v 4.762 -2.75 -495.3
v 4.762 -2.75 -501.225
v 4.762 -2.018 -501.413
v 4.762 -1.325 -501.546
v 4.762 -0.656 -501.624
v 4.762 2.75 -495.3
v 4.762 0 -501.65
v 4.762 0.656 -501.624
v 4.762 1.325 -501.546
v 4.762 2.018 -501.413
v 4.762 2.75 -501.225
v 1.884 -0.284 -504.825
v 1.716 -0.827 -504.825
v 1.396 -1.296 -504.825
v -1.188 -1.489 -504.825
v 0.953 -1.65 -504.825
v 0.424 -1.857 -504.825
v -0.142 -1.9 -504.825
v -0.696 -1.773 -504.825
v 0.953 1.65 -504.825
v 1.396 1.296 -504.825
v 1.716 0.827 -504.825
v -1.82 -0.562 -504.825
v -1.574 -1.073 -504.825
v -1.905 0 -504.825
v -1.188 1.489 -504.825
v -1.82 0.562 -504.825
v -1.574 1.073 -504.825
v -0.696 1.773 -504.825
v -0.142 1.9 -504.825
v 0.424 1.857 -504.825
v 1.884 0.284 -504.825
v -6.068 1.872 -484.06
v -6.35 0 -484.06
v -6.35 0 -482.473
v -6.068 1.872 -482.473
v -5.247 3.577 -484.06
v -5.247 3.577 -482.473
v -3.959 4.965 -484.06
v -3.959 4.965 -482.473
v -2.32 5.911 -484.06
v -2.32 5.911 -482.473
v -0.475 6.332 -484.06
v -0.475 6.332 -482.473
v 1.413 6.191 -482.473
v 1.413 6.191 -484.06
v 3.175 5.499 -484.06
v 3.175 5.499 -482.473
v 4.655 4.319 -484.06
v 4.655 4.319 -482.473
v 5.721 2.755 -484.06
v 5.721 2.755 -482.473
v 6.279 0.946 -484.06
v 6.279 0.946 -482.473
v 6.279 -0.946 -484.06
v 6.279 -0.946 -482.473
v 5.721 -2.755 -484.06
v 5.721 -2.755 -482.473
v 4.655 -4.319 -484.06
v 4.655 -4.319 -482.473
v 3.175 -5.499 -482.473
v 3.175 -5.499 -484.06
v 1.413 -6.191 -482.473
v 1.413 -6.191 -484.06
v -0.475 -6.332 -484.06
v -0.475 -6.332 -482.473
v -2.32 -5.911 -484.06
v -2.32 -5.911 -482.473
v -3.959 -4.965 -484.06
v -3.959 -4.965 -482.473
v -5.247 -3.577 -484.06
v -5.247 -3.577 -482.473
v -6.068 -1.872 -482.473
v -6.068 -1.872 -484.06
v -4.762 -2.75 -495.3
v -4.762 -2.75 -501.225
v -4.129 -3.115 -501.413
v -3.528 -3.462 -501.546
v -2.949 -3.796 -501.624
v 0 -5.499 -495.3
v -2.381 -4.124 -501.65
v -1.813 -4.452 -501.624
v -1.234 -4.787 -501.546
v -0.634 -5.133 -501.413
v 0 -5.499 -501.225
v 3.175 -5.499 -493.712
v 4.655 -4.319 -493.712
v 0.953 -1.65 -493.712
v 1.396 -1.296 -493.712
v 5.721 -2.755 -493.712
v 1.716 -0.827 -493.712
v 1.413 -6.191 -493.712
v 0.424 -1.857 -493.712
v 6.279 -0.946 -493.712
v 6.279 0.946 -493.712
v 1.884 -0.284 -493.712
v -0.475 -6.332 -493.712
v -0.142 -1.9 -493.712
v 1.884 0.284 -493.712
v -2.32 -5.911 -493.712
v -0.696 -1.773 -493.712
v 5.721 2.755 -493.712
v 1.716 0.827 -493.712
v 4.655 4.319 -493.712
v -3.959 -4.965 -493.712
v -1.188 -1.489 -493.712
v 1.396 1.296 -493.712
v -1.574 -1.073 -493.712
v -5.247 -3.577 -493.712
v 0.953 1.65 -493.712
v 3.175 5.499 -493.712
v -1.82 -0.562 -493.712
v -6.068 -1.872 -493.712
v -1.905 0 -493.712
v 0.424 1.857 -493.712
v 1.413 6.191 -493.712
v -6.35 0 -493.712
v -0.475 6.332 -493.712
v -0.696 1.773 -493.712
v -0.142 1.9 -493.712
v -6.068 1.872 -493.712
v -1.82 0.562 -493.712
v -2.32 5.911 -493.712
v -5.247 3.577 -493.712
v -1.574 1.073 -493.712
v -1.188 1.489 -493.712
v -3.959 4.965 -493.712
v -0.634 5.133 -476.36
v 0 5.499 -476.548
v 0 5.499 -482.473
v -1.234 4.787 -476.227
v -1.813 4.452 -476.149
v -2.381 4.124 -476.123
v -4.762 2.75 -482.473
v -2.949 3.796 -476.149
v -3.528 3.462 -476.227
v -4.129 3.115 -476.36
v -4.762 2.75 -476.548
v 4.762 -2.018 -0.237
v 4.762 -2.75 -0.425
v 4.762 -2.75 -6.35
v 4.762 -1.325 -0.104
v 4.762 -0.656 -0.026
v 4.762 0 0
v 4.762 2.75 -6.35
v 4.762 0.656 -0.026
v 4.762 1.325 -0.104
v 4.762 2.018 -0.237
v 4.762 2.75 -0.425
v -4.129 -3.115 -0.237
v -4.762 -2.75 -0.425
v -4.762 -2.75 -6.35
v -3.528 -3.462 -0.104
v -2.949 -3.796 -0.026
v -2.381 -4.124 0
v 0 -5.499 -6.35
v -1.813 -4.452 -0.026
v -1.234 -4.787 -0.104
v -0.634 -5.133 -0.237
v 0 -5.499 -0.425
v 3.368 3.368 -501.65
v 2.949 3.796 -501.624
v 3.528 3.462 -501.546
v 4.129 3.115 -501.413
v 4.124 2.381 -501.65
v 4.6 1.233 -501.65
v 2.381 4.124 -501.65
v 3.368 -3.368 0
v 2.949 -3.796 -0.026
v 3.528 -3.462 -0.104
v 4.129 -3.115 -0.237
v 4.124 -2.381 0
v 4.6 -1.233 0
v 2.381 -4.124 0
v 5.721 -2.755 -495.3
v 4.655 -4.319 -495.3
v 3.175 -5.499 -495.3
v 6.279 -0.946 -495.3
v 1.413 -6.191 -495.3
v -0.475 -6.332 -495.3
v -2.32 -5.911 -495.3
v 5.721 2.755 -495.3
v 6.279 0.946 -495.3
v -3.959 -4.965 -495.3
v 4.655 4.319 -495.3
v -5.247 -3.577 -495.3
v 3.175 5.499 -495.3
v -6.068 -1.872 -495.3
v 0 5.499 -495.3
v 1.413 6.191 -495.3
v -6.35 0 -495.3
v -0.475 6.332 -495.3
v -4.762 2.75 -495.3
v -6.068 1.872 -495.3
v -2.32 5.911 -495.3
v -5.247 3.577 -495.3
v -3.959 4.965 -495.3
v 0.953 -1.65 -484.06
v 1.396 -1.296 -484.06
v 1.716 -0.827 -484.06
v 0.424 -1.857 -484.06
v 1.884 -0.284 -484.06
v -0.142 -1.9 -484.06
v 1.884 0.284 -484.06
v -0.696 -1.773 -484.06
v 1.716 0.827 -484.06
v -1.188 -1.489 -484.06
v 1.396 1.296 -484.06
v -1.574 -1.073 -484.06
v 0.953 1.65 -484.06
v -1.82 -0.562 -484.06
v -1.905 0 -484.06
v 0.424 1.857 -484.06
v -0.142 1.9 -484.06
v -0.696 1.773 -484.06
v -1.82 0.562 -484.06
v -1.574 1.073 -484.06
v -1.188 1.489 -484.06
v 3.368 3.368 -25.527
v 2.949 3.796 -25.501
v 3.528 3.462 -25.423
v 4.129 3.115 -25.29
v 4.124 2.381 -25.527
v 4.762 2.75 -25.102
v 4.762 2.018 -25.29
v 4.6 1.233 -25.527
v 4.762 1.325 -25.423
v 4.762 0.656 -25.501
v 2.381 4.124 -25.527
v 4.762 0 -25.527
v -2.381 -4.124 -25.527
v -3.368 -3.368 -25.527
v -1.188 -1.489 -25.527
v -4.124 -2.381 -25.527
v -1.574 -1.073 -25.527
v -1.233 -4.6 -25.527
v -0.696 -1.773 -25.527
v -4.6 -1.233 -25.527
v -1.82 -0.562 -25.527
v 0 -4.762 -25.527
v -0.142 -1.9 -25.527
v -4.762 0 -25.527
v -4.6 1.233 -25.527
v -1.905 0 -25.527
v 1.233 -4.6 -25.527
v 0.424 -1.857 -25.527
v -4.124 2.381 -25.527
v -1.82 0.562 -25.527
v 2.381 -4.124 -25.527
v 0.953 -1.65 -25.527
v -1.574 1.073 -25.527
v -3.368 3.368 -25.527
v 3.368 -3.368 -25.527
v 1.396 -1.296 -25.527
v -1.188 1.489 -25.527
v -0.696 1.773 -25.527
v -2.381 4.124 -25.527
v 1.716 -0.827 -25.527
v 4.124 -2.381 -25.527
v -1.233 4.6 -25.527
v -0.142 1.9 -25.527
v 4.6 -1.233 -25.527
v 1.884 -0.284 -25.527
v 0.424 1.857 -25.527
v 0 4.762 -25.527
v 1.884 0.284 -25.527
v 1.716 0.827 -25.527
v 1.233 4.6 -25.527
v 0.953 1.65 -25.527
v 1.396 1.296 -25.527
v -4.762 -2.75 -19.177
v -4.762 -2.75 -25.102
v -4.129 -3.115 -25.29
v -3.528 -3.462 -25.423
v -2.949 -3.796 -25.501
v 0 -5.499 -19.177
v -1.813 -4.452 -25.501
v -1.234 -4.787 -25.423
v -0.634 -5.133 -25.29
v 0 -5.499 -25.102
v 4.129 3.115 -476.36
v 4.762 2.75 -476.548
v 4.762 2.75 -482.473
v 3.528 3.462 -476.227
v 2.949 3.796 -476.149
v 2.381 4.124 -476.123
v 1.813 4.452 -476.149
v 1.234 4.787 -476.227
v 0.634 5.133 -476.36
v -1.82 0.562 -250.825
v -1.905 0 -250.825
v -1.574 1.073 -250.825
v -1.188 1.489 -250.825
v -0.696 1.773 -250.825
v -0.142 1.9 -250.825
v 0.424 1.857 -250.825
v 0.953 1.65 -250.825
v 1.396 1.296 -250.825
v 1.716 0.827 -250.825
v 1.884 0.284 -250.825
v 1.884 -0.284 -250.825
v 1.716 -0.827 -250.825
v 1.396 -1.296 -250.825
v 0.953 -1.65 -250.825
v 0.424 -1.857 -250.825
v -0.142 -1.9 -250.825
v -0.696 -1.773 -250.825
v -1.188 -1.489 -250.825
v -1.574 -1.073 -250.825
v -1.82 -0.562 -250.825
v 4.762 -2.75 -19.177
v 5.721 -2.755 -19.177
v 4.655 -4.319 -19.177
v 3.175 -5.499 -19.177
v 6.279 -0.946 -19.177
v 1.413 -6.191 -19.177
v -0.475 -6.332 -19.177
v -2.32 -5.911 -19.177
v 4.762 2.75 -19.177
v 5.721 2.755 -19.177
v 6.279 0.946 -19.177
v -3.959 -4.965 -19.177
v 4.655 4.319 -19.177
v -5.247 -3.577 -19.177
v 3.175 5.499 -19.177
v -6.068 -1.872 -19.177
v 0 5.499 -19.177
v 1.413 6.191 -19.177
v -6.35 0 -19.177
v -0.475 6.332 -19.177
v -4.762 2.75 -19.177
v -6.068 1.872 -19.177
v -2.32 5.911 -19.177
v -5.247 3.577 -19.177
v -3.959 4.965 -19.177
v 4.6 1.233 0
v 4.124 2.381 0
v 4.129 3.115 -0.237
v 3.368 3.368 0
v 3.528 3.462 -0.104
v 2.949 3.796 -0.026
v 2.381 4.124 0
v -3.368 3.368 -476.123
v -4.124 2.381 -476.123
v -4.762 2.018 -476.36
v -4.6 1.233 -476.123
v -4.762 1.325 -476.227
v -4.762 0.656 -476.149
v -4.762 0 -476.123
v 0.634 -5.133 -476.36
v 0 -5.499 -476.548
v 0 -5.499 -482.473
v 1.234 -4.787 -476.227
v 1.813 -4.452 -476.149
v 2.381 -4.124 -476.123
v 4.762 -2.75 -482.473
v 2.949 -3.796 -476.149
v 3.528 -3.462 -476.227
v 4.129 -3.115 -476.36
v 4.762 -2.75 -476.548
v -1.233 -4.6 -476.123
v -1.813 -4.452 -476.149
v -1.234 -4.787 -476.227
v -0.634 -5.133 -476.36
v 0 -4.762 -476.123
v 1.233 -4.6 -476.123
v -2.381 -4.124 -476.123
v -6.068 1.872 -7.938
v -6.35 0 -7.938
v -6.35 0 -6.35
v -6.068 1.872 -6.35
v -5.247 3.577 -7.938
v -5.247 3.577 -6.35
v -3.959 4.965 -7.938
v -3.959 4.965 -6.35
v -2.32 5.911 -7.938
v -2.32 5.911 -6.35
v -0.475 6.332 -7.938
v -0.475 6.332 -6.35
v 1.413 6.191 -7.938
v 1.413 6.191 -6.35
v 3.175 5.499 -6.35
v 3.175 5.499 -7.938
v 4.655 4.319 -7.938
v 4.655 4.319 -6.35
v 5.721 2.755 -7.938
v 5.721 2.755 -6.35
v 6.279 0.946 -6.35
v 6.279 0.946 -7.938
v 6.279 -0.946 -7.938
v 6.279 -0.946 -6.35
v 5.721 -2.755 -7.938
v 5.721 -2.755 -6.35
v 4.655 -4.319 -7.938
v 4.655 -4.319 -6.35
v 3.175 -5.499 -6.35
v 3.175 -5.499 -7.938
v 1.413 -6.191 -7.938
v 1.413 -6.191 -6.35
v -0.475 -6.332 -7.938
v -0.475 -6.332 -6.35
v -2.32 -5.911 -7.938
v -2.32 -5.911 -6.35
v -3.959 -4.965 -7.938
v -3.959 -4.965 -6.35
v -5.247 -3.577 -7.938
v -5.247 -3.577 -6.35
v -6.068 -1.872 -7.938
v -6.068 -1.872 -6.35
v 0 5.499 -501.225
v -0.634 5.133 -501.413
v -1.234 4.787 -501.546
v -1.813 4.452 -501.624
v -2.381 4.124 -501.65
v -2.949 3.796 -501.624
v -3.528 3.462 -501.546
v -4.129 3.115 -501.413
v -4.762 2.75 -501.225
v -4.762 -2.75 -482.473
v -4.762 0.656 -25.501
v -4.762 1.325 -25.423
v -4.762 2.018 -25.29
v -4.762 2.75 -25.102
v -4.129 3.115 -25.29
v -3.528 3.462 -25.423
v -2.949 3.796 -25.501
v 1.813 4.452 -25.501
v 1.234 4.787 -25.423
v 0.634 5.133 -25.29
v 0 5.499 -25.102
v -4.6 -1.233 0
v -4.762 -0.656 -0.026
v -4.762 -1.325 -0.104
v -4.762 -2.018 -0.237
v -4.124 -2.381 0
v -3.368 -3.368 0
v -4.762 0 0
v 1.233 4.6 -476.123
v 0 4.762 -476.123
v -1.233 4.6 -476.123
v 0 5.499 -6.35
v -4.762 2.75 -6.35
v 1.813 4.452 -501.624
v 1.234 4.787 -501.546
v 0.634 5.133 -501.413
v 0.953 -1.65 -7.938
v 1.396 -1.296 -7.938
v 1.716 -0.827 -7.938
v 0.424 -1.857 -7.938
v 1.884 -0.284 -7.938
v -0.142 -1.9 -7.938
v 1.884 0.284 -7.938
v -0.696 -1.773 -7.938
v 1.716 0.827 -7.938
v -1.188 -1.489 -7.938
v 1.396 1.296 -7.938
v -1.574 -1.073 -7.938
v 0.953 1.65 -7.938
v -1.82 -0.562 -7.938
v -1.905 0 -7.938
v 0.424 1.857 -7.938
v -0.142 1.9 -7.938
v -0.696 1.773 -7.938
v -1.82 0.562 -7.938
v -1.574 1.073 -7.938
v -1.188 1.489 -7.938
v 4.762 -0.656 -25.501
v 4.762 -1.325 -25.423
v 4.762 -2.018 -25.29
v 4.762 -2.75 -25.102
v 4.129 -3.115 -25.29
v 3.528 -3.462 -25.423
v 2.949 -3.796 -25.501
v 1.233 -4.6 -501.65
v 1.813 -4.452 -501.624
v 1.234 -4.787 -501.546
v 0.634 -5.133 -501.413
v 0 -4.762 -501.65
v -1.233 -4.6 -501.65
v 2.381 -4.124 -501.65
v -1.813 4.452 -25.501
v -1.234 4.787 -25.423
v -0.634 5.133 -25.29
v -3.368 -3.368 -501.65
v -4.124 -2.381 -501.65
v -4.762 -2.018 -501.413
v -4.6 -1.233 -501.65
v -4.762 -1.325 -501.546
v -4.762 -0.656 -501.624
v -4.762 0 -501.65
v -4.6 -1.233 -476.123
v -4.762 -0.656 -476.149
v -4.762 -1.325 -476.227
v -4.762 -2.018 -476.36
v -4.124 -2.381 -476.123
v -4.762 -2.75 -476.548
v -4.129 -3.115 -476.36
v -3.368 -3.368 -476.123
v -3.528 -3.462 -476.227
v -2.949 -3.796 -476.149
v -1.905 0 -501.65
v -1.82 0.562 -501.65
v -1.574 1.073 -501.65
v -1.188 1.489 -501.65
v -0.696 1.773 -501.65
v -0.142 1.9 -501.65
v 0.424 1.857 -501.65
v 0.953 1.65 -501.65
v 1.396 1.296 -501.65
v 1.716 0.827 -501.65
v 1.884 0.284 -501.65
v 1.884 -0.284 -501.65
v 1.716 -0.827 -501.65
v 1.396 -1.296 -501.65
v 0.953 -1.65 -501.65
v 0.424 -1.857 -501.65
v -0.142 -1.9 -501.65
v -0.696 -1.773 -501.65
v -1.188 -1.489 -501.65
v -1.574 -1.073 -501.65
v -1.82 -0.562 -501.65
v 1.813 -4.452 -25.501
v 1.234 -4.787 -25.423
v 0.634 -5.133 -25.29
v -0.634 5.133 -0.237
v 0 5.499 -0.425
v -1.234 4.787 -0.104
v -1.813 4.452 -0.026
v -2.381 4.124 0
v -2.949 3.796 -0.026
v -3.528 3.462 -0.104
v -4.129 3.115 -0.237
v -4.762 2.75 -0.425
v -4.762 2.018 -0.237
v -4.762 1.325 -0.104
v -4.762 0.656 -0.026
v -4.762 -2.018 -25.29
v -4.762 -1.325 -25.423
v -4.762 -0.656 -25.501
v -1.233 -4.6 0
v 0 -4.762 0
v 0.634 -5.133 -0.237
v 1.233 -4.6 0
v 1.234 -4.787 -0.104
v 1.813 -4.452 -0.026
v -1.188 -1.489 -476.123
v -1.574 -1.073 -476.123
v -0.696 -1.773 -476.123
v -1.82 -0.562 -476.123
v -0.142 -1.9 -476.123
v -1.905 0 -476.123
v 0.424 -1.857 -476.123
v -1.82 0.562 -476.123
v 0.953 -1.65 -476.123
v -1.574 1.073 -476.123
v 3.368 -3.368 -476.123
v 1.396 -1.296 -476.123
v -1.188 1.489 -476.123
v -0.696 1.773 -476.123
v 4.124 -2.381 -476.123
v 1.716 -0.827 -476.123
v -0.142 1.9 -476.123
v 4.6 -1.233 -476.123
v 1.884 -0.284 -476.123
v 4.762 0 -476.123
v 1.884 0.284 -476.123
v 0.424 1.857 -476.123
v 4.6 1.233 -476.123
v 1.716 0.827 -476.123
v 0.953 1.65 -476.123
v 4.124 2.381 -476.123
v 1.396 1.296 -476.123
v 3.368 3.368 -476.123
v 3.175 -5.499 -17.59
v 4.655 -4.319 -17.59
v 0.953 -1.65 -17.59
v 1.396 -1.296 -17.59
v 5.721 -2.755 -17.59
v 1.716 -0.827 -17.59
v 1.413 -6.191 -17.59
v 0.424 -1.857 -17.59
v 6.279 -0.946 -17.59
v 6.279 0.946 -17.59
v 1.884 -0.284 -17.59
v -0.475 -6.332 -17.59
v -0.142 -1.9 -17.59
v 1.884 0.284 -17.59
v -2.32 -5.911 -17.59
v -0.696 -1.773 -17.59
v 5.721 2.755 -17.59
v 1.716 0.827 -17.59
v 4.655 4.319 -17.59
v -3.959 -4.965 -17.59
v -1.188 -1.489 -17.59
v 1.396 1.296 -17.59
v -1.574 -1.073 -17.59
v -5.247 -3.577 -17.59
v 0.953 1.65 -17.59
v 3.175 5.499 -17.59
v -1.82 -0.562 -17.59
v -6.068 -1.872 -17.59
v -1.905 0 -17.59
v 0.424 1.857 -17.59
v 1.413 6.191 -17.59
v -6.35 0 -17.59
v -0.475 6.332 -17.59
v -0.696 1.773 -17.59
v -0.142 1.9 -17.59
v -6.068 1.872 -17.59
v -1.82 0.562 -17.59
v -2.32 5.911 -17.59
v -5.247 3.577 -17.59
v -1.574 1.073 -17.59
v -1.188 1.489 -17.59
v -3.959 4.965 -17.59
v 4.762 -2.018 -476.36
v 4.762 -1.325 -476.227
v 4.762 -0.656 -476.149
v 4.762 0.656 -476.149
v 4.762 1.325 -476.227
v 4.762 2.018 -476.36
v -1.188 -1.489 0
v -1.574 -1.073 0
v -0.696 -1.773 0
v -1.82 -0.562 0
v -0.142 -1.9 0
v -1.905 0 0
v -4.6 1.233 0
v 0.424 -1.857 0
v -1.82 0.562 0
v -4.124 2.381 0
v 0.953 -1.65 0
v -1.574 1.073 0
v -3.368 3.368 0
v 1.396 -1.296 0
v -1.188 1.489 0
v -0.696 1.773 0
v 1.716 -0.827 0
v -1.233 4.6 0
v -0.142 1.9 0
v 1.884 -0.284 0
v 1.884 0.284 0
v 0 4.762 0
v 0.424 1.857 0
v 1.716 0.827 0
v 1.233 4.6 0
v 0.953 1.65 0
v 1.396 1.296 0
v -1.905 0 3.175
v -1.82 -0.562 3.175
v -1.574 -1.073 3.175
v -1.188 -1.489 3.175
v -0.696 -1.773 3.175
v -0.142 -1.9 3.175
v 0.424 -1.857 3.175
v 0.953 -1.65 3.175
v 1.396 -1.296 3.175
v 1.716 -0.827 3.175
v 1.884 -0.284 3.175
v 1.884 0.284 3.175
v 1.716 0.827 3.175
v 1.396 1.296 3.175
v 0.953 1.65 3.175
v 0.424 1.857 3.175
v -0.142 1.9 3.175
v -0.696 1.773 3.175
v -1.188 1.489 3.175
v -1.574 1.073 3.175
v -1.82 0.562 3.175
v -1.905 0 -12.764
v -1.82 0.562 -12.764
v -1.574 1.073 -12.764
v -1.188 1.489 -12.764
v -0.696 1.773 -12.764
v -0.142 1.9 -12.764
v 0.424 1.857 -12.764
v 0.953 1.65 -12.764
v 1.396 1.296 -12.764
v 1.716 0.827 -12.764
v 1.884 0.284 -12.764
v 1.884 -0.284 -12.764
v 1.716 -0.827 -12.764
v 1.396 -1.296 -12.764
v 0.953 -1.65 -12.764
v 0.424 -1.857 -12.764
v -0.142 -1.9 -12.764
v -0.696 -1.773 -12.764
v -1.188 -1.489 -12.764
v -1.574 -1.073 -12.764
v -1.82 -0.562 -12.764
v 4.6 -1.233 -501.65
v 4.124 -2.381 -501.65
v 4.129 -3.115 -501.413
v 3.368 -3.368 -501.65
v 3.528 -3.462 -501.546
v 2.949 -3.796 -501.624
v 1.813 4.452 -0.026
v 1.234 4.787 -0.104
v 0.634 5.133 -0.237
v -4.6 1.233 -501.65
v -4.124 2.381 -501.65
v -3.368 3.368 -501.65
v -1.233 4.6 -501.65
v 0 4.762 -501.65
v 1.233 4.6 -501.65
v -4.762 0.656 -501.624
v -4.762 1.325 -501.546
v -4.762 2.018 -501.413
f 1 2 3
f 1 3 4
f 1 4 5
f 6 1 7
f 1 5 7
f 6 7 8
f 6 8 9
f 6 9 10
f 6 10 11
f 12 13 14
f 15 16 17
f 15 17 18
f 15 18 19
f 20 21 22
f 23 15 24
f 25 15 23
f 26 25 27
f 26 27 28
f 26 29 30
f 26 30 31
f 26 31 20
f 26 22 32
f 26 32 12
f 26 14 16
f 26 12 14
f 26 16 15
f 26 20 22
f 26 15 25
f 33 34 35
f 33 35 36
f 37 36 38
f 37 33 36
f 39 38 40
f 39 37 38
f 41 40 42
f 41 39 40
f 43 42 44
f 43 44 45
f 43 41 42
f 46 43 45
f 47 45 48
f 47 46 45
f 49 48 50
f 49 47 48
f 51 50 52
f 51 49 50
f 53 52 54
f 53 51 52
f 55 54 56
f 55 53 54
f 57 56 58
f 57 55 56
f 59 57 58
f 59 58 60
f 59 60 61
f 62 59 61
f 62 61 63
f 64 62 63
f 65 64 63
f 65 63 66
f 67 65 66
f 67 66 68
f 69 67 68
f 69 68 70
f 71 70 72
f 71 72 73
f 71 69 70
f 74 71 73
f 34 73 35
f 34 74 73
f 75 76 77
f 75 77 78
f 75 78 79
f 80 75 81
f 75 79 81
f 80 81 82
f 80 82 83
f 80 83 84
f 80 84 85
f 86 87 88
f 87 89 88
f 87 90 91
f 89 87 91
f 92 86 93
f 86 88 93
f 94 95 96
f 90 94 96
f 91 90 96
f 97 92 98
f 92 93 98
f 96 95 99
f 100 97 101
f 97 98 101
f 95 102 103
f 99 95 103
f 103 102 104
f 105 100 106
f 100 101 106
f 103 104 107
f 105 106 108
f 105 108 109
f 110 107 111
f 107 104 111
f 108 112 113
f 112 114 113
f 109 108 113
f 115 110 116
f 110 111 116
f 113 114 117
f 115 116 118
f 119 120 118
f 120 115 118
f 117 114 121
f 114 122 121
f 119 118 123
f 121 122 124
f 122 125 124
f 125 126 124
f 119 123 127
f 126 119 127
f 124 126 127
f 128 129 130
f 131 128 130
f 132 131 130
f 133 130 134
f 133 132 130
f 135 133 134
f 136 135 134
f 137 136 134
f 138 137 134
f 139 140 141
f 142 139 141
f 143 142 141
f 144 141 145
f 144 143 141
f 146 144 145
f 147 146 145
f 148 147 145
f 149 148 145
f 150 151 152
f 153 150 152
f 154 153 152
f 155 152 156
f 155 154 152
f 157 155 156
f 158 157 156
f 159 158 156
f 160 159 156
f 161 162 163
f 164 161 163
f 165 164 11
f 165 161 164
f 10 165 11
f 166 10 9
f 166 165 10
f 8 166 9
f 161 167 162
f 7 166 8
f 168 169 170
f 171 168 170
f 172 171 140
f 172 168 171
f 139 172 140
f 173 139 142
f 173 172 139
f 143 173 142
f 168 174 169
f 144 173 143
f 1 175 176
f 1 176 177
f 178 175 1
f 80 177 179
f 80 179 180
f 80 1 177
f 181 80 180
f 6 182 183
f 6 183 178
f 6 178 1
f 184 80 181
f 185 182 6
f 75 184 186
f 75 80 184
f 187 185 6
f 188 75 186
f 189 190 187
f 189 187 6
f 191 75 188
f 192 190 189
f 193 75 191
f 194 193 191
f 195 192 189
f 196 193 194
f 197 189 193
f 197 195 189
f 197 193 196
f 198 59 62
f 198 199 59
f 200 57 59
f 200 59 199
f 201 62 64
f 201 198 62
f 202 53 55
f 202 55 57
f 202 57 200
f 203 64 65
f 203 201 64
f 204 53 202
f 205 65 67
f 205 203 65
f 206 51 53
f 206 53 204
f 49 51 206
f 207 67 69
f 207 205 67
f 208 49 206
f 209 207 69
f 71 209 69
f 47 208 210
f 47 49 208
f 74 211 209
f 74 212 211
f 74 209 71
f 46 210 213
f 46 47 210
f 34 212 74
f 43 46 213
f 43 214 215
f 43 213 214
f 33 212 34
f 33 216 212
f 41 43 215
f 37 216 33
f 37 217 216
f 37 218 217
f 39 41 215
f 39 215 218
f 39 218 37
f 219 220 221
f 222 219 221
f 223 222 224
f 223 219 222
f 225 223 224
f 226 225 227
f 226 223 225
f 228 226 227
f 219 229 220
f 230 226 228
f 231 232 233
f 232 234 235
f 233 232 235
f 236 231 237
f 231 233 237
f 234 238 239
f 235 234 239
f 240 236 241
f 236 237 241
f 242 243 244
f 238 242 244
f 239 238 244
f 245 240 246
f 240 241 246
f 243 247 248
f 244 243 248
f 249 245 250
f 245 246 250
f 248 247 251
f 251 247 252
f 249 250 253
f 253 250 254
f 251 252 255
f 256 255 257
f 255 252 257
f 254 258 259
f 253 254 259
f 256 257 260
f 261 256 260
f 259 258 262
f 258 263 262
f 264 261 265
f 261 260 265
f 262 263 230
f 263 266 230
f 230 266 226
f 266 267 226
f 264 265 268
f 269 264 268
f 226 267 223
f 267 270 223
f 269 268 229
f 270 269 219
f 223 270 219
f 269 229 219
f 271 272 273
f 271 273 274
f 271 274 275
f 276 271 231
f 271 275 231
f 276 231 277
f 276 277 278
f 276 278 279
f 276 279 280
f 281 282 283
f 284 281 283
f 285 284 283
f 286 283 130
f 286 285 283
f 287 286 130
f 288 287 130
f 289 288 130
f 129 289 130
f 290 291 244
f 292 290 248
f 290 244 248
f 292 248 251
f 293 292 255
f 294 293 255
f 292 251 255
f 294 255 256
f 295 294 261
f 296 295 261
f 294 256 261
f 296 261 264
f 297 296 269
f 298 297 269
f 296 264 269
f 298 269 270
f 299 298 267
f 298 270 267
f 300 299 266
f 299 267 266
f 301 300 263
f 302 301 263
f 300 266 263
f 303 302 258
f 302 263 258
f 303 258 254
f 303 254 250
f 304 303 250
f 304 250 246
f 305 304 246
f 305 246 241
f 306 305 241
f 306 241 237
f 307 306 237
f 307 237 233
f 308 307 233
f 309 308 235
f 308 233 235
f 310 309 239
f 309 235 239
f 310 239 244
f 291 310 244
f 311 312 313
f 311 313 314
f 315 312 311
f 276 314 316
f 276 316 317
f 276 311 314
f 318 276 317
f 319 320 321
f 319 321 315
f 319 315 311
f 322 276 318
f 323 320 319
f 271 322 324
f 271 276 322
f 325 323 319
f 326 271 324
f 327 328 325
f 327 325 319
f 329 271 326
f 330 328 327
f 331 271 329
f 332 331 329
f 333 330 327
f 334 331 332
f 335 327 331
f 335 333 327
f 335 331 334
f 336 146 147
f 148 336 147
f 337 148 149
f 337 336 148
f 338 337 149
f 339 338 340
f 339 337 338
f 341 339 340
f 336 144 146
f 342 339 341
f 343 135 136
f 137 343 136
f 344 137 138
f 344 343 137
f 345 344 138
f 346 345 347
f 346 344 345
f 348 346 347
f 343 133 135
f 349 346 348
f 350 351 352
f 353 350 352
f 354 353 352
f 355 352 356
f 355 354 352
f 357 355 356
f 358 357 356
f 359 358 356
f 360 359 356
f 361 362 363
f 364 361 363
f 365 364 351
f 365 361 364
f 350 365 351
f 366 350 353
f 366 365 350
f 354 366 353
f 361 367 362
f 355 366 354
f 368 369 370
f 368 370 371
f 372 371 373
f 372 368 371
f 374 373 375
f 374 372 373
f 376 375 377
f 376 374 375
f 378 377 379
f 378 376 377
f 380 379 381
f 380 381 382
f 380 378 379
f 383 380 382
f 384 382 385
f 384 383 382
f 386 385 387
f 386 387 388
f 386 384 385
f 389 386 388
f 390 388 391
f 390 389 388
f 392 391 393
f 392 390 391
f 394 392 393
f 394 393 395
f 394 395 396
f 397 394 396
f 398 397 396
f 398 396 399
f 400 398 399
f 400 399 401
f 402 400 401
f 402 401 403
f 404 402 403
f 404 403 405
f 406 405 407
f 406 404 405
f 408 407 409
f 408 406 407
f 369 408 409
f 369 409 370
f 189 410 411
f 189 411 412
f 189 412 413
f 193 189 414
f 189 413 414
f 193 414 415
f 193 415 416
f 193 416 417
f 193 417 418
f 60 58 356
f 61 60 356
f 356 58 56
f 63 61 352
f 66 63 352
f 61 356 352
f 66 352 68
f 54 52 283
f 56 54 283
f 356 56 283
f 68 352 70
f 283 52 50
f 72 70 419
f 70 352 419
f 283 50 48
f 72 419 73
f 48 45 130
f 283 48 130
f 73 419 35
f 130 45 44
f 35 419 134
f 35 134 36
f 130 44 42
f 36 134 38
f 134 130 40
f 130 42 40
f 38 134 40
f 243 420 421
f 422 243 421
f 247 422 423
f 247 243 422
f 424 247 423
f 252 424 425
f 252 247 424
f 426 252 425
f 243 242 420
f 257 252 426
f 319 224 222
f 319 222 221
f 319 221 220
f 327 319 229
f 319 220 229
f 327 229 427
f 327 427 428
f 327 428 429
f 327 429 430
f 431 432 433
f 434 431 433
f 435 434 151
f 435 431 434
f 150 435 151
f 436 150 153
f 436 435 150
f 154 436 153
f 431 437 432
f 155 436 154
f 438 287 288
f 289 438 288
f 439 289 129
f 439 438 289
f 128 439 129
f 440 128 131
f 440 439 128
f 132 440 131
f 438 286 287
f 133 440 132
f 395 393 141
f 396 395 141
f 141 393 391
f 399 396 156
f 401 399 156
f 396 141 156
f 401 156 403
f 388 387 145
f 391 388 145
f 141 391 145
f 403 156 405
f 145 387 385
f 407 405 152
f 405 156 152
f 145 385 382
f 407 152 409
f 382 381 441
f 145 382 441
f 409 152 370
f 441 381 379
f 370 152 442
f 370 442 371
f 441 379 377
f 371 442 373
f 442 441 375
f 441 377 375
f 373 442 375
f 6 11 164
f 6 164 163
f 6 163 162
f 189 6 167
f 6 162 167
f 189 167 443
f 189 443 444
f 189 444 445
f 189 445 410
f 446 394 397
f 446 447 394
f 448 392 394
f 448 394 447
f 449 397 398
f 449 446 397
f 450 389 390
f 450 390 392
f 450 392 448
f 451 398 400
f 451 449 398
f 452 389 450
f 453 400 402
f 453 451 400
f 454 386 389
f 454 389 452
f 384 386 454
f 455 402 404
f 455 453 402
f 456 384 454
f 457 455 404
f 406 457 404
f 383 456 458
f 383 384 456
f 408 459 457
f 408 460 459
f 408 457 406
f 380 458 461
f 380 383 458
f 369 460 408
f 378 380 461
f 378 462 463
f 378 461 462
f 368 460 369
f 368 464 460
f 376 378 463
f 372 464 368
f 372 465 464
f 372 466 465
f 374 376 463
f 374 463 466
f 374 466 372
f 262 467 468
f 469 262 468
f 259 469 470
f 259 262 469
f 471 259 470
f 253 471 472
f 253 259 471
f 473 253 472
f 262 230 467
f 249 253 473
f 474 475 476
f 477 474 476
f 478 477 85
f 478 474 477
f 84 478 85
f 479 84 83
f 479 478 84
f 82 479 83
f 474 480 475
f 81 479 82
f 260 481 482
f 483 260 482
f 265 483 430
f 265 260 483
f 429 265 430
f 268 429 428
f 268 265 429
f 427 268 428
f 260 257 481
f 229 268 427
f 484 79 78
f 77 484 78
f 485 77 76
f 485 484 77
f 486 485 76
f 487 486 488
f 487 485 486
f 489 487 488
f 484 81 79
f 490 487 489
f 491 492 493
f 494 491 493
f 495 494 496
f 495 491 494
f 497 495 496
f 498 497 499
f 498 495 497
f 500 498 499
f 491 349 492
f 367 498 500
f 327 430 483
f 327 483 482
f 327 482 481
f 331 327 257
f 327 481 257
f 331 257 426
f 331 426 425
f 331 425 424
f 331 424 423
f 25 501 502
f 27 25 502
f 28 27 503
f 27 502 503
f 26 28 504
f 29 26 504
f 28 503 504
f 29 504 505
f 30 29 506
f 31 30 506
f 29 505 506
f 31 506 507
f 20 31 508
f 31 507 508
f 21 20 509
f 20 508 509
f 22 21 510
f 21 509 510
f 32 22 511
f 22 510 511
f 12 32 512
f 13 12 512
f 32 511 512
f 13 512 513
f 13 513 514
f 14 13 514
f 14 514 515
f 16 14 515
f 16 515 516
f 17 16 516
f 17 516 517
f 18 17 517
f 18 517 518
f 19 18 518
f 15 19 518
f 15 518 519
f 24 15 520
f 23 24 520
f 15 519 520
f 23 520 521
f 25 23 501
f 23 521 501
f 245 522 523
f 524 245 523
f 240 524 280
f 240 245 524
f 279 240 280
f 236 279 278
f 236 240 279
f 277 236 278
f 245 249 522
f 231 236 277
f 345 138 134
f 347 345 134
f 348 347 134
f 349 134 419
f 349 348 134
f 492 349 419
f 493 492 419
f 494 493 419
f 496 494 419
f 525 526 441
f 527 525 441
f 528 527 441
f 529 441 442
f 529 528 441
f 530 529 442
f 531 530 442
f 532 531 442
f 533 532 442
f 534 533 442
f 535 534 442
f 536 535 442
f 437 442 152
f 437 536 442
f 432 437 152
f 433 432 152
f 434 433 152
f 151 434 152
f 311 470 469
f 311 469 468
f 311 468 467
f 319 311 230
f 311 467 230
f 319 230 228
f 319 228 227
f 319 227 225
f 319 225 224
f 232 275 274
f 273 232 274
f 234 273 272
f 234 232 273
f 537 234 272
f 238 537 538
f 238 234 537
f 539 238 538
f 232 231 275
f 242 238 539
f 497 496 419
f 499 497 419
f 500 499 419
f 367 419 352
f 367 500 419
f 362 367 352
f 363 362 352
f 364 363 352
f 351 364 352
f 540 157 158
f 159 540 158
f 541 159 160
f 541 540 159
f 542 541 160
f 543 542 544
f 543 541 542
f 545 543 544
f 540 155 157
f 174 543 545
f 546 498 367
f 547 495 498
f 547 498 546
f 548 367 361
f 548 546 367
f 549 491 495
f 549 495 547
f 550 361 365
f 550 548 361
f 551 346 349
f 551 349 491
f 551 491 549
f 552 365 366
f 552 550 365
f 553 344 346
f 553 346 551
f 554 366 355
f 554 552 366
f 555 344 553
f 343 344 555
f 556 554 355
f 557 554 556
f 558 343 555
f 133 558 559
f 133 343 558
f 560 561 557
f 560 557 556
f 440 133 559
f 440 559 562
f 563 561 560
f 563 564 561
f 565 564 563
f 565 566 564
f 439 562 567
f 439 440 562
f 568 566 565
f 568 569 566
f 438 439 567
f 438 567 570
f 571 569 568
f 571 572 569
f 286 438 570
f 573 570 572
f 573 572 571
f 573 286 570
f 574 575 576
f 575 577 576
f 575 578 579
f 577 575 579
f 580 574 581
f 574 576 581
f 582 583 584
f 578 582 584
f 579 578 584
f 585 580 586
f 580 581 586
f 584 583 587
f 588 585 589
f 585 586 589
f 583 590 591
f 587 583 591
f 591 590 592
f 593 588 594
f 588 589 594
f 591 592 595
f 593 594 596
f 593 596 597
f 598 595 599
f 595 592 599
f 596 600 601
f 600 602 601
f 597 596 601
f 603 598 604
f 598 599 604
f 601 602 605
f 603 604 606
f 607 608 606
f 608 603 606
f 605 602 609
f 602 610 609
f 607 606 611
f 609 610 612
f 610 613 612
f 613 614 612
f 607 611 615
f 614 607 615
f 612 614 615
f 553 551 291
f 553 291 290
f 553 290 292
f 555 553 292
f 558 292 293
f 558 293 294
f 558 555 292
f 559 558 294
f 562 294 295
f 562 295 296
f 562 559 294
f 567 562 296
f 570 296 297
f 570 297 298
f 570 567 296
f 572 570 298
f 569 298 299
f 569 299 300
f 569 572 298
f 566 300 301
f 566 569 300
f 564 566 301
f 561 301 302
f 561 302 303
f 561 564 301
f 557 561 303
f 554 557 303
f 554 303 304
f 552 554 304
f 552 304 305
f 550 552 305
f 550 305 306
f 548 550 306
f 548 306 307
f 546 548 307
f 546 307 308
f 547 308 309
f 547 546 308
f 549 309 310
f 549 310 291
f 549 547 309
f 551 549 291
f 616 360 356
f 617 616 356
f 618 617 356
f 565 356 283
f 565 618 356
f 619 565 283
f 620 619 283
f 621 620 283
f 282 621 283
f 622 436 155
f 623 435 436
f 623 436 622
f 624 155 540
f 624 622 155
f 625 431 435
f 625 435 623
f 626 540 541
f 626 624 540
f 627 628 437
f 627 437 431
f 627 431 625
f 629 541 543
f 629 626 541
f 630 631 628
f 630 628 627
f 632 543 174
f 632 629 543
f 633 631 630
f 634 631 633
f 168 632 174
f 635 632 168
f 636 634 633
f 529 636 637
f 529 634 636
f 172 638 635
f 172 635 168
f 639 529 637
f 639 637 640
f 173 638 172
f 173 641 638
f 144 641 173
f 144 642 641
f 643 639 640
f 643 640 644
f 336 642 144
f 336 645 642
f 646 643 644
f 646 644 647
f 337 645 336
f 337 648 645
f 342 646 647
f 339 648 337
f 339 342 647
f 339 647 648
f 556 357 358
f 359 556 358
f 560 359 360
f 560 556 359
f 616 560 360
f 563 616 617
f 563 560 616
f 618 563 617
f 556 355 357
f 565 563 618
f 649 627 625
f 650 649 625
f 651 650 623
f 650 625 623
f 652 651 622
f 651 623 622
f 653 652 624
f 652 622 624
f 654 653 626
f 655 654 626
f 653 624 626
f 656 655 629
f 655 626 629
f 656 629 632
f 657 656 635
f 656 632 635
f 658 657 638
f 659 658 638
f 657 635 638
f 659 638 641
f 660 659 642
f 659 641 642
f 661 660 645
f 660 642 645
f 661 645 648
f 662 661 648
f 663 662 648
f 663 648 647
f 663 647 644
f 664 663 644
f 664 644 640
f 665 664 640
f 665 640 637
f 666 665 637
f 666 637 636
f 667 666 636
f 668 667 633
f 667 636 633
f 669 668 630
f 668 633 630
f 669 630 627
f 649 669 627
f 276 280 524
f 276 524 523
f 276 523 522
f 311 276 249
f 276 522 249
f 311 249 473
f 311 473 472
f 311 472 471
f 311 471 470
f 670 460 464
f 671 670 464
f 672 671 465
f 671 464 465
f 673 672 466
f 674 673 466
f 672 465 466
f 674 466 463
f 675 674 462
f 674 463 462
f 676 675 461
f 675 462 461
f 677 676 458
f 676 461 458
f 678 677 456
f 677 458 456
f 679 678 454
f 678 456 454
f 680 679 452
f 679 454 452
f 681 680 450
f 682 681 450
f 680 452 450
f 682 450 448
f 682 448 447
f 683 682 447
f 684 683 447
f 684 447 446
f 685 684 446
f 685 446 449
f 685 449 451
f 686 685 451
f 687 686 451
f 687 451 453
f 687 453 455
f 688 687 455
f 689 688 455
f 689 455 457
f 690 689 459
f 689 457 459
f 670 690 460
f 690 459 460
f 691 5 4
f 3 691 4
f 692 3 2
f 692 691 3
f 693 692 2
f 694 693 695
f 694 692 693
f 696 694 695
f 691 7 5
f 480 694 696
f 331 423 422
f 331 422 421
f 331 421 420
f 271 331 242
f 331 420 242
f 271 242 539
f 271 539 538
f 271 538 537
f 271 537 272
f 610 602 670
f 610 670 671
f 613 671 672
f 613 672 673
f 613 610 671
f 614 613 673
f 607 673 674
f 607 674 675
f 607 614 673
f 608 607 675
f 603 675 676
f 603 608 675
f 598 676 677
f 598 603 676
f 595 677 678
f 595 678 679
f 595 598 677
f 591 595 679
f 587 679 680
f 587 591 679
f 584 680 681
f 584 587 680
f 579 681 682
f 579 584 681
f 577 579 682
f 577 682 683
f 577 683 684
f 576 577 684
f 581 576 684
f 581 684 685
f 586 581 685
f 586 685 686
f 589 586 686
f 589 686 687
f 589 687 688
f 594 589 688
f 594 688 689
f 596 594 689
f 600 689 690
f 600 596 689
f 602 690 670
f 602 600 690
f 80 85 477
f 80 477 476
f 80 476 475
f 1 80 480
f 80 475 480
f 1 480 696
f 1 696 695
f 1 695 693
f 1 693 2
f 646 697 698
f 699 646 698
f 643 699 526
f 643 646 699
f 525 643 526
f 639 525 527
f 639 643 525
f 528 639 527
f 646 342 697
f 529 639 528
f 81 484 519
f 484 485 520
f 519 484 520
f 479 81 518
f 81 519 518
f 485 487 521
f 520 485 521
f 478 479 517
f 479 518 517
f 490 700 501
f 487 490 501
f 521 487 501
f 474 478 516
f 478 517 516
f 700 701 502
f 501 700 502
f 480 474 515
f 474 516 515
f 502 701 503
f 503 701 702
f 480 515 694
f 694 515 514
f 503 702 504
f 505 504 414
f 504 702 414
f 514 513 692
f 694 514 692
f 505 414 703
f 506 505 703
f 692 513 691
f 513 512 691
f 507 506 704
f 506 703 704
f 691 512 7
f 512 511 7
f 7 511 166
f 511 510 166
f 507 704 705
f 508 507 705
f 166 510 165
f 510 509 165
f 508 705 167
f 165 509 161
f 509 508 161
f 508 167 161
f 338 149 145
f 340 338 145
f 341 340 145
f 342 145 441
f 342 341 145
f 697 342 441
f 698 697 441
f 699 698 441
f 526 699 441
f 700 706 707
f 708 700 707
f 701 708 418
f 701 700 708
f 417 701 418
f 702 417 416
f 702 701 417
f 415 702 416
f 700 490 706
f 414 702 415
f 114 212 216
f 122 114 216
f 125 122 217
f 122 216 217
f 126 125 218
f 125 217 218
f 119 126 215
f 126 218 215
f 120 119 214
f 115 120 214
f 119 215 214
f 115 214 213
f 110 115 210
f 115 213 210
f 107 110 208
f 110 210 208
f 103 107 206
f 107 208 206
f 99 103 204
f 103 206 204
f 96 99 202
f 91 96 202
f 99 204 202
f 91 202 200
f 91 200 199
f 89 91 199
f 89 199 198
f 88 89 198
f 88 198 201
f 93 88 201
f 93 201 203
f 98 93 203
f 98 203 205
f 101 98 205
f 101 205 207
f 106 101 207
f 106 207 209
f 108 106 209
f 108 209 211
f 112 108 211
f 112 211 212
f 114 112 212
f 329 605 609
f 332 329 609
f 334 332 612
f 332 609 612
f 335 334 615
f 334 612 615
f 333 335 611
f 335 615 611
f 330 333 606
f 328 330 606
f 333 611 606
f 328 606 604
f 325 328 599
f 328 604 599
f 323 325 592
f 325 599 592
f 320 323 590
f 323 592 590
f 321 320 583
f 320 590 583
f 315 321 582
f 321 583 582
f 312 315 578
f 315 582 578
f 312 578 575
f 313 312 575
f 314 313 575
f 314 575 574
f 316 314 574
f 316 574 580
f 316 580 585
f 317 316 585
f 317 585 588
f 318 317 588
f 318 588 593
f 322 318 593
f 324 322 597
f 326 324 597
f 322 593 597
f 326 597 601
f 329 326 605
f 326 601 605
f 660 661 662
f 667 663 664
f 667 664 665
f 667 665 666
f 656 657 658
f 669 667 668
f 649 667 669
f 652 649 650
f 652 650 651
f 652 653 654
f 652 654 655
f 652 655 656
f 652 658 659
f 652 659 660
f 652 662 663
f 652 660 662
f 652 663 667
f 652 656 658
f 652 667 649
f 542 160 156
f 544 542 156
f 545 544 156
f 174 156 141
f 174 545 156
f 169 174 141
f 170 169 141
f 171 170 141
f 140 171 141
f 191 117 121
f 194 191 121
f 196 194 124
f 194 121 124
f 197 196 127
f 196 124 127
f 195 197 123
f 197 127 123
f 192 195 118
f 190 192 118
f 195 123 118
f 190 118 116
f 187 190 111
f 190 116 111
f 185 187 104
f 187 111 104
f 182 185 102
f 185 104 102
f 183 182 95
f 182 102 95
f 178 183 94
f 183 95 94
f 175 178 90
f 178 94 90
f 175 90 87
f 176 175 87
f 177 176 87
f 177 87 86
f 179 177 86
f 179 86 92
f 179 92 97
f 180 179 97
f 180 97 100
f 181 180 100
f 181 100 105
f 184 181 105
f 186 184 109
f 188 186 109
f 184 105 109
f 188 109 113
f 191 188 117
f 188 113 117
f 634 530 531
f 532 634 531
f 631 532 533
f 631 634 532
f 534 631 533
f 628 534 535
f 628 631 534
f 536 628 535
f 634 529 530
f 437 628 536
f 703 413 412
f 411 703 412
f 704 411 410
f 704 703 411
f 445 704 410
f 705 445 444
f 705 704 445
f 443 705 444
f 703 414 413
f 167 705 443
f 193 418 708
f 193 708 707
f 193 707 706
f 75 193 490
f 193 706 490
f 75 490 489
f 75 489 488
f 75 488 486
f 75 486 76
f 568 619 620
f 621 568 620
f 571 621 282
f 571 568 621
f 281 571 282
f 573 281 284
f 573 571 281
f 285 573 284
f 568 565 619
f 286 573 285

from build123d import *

# Parameters (mm, degrees)
EXTRUDE1_DEPTH          = 7.9375
SKETCH13_R              = 6.35
EXTRUDE3_DEPTH          = 1.5875
SKETCH2_OUTSIDE_W       = 63.61
SKETCH2_OUTSIDE_H       = 63.61
SKETCH2_OUTSIDE_R       = 4.7625
CUT_EXTRUDE1_DEPTH      = 12.985362166
CUT_EXTRUDE1_DRAFT      = -60
SKETCH14_R              = 1.905
BOSS_EXTRUDE1_DEPTH     = 4.826
MIRROR1_COPY_1_SKETCH_W = 63.61
MIRROR1_COPY_1_SKETCH_H = 63.61
MIRROR1_COPY_1_SKETCH_R = 4.7625
MIRROR1_COPY_1_DEPTH    = 12.985362166
MIRROR1_COPY_1_DRAFT    = -60
SKETCH15_R              = 1.905
BOSS_EXTRUDE2_DEPTH     = 225.298
MIRROR2_COPY_1_SKETCH_W = 63.61
MIRROR2_COPY_1_SKETCH_H = 63.61
MIRROR2_COPY_1_SKETCH_R = 4.7625
MIRROR2_COPY_1_DEPTH    = 12.985362166
MIRROR2_COPY_1_DRAFT    = -60
MIRROR2_COPY_2_DEPTH    = 7.9375
MIRROR2_COPY_3_SKETCH_R = 6.35
MIRROR2_COPY_3_DEPTH    = 1.5875
MIRROR2_COPY_4_SKETCH_R = 1.905
MIRROR2_COPY_4_DEPTH    = 4.826
MIRROR2_COPY_5_SKETCH_W = 63.61
MIRROR2_COPY_5_SKETCH_H = 63.61
MIRROR2_COPY_5_SKETCH_R = 4.7625
MIRROR2_COPY_5_DEPTH    = 12.985362166
MIRROR2_COPY_5_DRAFT    = -60
SKETCH16_R              = 1.905
BOSS_EXTRUDE3_DEPTH     = 3.175
SKETCH4_R               = 1.905
BOSS_EXTRUDE4_DEPTH     = 3.175


with BuildPart() as part:
    # Sketch1 → Extrude1 (new body)
    with BuildSketch(Plane.XY):
        Polygon((0, 5.499261314), (-4.7625, 2.749630657), (-4.7625, -2.749630657), (0, -5.499261314), (4.7625, -2.749630657), (4.7625, 2.749630657), align=None)
    extrude1 = extrude(amount=-EXTRUDE1_DEPTH)

    # Sketch13 → Extrude3 (add)
    with BuildSketch(Plane(origin=(0, 0, -7.9375), x_dir=(-1, 0, 0), z_dir=(0, 0, -1))):
        Circle(SKETCH13_R)
    extrude3 = extrude(amount=-EXTRUDE3_DEPTH)


with BuildPart() as cut_extrude1_tool:
    # Sketch2 outside → Cut-Extrude1 (with draft: the straight prism first)
    with BuildSketch(Plane.XY):
        Rectangle(SKETCH2_OUTSIDE_W, SKETCH2_OUTSIDE_H)
        Circle(SKETCH2_OUTSIDE_R, mode=Mode.SUBTRACT)
    extrude(amount=-CUT_EXTRUDE1_DEPTH)
    # Cut-Extrude1: the draft: its side faces are tilted about the plane it starts from
    cut_extrude1_sides = [cut_extrude1_tool.faces().sort_by_distance(p)[0] for p in [
        (0, -31.805, -6.492681083),
        (31.805, 0, -6.492681083),
        (0, 31.805, -6.492681083),
        (-31.805, 0, -6.492681083),
        (-4.7625, 0, -6.492681083),
    ]]
    draft(cut_extrude1_sides, Plane.XY, CUT_EXTRUDE1_DRAFT)


with BuildPart() as part_1:
    add(part.part)

    # Cut-Extrude1: cut by cut_extrude1_tool
    add(cut_extrude1_tool.part, mode=Mode.SUBTRACT)

    # Sketch14 → Boss-Extrude1 (add)
    with BuildSketch(Plane(origin=(0, 0, -7.9375), x_dir=(-1, 0, 0), z_dir=(0, 0, -1))):
        Circle(SKETCH14_R)
    boss_extrude1 = extrude(amount=BOSS_EXTRUDE1_DEPTH)

    # Mirror1: Extrude1, Extrude3, Boss-Extrude1 across plane
    add(extrude1.mirror(Plane(origin=(0, 0, -12.7635), x_dir=(1, 0, 0), z_dir=(0, 0, -1))))
    add(extrude3.mirror(Plane(origin=(0, 0, -12.7635), x_dir=(1, 0, 0), z_dir=(0, 0, -1))))
    add(boss_extrude1.mirror(Plane(origin=(0, 0, -12.7635), x_dir=(1, 0, 0), z_dir=(0, 0, -1))))


with BuildPart() as mirror1_copy_1_tool:
    # Mirror1 copy 1 sketch → Mirror1 copy 1 (with draft: the straight prism first)
    with BuildSketch(Plane(origin=(0, 0, -25.527), x_dir=(1, 0, 0), z_dir=(0, 0, -1))):
        Rectangle(MIRROR1_COPY_1_SKETCH_W, MIRROR1_COPY_1_SKETCH_H)
        Circle(MIRROR1_COPY_1_SKETCH_R, mode=Mode.SUBTRACT)
    extrude(amount=-MIRROR1_COPY_1_DEPTH)
    # Mirror1 copy 1: the draft: its side faces are tilted about the plane it starts from
    mirror1_copy_1_sides = [mirror1_copy_1_tool.faces().sort_by_distance(p)[0] for p in [
        (0, -31.805, -19.034318917),
        (31.805, 0, -19.034318917),
        (0, 31.805, -19.034318917),
        (-31.805, 0, -19.034318917),
        (-4.7625, 0, -19.034318917),
    ]]
    draft(mirror1_copy_1_sides, Plane(origin=(0, 0, -25.527), x_dir=(1, 0, 0), z_dir=(0, 0, -1)), MIRROR1_COPY_1_DRAFT)


with BuildPart() as part_2:
    add(part_1.part)

    # Mirror1 copy 1: cut by mirror1_copy_1_tool
    add(mirror1_copy_1_tool.part, mode=Mode.SUBTRACT)

    # Sketch15 → Boss-Extrude2 (add)
    with BuildSketch(Plane(origin=(0, 0, -25.527), x_dir=(-1, 0, 0), z_dir=(0, 0, -1))):
        Circle(SKETCH15_R)
    boss_extrude2 = extrude(amount=BOSS_EXTRUDE2_DEPTH)

    # Mirror2: Extrude1, Extrude3, Boss-Extrude1, Boss-Extrude2 across plane
    add(extrude1.mirror(Plane(origin=(0, 0, -250.825), x_dir=(1, 0, 0), z_dir=(0, 0, -1))))
    add(extrude3.mirror(Plane(origin=(0, 0, -250.825), x_dir=(1, 0, 0), z_dir=(0, 0, -1))))
    add(boss_extrude1.mirror(Plane(origin=(0, 0, -250.825), x_dir=(1, 0, 0), z_dir=(0, 0, -1))))
    add(boss_extrude2.mirror(Plane(origin=(0, 0, -250.825), x_dir=(1, 0, 0), z_dir=(0, 0, -1))))


with BuildPart() as mirror2_copy_1_tool:
    # Mirror2 copy 1 sketch → Mirror2 copy 1 (with draft: the straight prism first)
    with BuildSketch(Plane(origin=(0, 0, -501.65), x_dir=(1, 0, 0), z_dir=(0, 0, -1))):
        Rectangle(MIRROR2_COPY_1_SKETCH_W, MIRROR2_COPY_1_SKETCH_H)
        Circle(MIRROR2_COPY_1_SKETCH_R, mode=Mode.SUBTRACT)
    extrude(amount=-MIRROR2_COPY_1_DEPTH)
    # Mirror2 copy 1: the draft: its side faces are tilted about the plane it starts from
    mirror2_copy_1_sides = [mirror2_copy_1_tool.faces().sort_by_distance(p)[0] for p in [
        (0, -31.805, -495.157318917),
        (31.805, 0, -495.157318917),
        (0, 31.805, -495.157318917),
        (-31.805, 0, -495.157318917),
        (-4.7625, 0, -495.157318917),
    ]]
    draft(mirror2_copy_1_sides, Plane(origin=(0, 0, -501.65), x_dir=(1, 0, 0), z_dir=(0, 0, -1)), MIRROR2_COPY_1_DRAFT)


with BuildPart() as part_3:
    add(part_2.part)

    # Mirror2 copy 1: cut by mirror2_copy_1_tool
    add(mirror2_copy_1_tool.part, mode=Mode.SUBTRACT)

    # Mirror2 copy 2 sketch → Mirror2 copy 2 (add)
    with BuildSketch(Plane.XY.offset(-476.123)):
        Polygon((0, 5.499261314), (-4.7625, 2.749630657), (-4.7625, -2.749630657), (0, -5.499261314), (4.7625, -2.749630657), (4.7625, 2.749630657), align=None)
    extrude(amount=-MIRROR2_COPY_2_DEPTH)

    # Mirror2 copy 3 sketch → Mirror2 copy 3 (add)
    with BuildSketch(Plane(origin=(0, 0, -484.0605), x_dir=(-1, 0, 0), z_dir=(0, 0, -1))):
        Circle(MIRROR2_COPY_3_SKETCH_R)
    extrude(amount=-MIRROR2_COPY_3_DEPTH)

    # Mirror2 copy 4 sketch → Mirror2 copy 4 (add)
    with BuildSketch(Plane(origin=(0, 0, -484.0605), x_dir=(-1, 0, 0), z_dir=(0, 0, -1))):
        Circle(MIRROR2_COPY_4_SKETCH_R)
    extrude(amount=MIRROR2_COPY_4_DEPTH)


with BuildPart() as mirror2_copy_5_tool:
    # Mirror2 copy 5 sketch → Mirror2 copy 5 (with draft: the straight prism first)
    with BuildSketch(Plane.XY.offset(-476.123)):
        Rectangle(MIRROR2_COPY_5_SKETCH_W, MIRROR2_COPY_5_SKETCH_H)
        Circle(MIRROR2_COPY_5_SKETCH_R, mode=Mode.SUBTRACT)
    extrude(amount=-MIRROR2_COPY_5_DEPTH)
    # Mirror2 copy 5: the draft: its side faces are tilted about the plane it starts from
    mirror2_copy_5_sides = [mirror2_copy_5_tool.faces().sort_by_distance(p)[0] for p in [
        (0, -31.805, -482.615681083),
        (31.805, 0, -482.615681083),
        (0, 31.805, -482.615681083),
        (-31.805, 0, -482.615681083),
        (-4.7625, 0, -482.615681083),
    ]]
    draft(mirror2_copy_5_sides, Plane.XY.offset(-476.123), MIRROR2_COPY_5_DRAFT)


with BuildPart() as part_4:
    add(part_3.part)

    # Mirror2 copy 5: cut by mirror2_copy_5_tool
    add(mirror2_copy_5_tool.part, mode=Mode.SUBTRACT)

    # Sketch16 → Boss-Extrude3 (add)
    with BuildSketch(Plane(origin=(0, 0, -501.65), x_dir=(-1, 0, 0), z_dir=(0, 0, -1))):
        Circle(SKETCH16_R)
    extrude(amount=BOSS_EXTRUDE3_DEPTH)

    # Sketch4 → Boss-Extrude4 (add)
    with BuildSketch(Plane.XY):
        with Locations(Location((0, 0, 0), (0, 0, 180))):
            Circle(SKETCH4_R)
    extrude(amount=BOSS_EXTRUDE4_DEPTH)


solid = part_4.part
